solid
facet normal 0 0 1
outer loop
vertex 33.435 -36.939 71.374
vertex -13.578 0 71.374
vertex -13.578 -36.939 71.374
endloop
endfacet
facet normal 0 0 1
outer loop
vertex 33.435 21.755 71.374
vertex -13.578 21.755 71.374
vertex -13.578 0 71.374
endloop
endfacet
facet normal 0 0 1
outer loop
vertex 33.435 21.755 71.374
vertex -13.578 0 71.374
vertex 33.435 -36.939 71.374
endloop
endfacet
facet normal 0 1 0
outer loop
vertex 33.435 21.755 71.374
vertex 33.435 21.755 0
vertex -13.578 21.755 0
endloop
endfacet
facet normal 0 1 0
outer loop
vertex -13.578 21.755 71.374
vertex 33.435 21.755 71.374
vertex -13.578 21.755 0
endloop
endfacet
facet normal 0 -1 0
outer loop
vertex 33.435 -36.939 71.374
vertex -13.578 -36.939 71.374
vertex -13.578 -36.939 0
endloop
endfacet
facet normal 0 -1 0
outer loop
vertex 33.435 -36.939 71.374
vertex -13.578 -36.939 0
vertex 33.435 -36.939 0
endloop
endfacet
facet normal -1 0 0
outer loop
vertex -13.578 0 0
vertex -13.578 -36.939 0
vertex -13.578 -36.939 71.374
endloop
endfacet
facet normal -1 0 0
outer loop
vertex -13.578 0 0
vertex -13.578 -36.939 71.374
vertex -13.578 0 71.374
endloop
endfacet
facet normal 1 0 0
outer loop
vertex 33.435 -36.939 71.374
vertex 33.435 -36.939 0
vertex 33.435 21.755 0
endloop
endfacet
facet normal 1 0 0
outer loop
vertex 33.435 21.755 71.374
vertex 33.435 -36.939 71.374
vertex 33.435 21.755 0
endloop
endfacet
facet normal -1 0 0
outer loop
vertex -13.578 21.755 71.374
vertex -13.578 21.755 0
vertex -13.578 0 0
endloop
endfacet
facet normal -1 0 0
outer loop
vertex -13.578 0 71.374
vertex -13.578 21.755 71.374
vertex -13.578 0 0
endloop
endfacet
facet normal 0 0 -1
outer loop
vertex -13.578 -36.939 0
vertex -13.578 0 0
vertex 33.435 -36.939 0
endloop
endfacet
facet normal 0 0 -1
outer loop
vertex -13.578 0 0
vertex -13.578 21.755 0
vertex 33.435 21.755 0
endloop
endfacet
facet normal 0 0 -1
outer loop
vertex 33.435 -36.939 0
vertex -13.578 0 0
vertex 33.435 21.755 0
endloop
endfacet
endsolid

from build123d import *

# Parameters (mm, degrees)
F0_W     = 33.434838
F0_H     = 36.938924
F0_W_2   = 13.578339
F1_DEPTH = 71.374


with BuildPart() as f1:
    # F0 (on Top) → F1 (new body)
    with BuildSketch(Plane.XY):
        with Locations((16.717419, -18.469462)):
            Rectangle(F0_W, F0_H)
        with Locations((-6.789169, -18.469462)):
            Rectangle(F0_W_2, F0_H)
        Polygon((-13.578339, 0), (0, 0), (33.434838, 0), (33.434838, 21.754544), (-13.578339, 21.754544), align=None)
    extrude(amount=F1_DEPTH)


solid = f1.part
